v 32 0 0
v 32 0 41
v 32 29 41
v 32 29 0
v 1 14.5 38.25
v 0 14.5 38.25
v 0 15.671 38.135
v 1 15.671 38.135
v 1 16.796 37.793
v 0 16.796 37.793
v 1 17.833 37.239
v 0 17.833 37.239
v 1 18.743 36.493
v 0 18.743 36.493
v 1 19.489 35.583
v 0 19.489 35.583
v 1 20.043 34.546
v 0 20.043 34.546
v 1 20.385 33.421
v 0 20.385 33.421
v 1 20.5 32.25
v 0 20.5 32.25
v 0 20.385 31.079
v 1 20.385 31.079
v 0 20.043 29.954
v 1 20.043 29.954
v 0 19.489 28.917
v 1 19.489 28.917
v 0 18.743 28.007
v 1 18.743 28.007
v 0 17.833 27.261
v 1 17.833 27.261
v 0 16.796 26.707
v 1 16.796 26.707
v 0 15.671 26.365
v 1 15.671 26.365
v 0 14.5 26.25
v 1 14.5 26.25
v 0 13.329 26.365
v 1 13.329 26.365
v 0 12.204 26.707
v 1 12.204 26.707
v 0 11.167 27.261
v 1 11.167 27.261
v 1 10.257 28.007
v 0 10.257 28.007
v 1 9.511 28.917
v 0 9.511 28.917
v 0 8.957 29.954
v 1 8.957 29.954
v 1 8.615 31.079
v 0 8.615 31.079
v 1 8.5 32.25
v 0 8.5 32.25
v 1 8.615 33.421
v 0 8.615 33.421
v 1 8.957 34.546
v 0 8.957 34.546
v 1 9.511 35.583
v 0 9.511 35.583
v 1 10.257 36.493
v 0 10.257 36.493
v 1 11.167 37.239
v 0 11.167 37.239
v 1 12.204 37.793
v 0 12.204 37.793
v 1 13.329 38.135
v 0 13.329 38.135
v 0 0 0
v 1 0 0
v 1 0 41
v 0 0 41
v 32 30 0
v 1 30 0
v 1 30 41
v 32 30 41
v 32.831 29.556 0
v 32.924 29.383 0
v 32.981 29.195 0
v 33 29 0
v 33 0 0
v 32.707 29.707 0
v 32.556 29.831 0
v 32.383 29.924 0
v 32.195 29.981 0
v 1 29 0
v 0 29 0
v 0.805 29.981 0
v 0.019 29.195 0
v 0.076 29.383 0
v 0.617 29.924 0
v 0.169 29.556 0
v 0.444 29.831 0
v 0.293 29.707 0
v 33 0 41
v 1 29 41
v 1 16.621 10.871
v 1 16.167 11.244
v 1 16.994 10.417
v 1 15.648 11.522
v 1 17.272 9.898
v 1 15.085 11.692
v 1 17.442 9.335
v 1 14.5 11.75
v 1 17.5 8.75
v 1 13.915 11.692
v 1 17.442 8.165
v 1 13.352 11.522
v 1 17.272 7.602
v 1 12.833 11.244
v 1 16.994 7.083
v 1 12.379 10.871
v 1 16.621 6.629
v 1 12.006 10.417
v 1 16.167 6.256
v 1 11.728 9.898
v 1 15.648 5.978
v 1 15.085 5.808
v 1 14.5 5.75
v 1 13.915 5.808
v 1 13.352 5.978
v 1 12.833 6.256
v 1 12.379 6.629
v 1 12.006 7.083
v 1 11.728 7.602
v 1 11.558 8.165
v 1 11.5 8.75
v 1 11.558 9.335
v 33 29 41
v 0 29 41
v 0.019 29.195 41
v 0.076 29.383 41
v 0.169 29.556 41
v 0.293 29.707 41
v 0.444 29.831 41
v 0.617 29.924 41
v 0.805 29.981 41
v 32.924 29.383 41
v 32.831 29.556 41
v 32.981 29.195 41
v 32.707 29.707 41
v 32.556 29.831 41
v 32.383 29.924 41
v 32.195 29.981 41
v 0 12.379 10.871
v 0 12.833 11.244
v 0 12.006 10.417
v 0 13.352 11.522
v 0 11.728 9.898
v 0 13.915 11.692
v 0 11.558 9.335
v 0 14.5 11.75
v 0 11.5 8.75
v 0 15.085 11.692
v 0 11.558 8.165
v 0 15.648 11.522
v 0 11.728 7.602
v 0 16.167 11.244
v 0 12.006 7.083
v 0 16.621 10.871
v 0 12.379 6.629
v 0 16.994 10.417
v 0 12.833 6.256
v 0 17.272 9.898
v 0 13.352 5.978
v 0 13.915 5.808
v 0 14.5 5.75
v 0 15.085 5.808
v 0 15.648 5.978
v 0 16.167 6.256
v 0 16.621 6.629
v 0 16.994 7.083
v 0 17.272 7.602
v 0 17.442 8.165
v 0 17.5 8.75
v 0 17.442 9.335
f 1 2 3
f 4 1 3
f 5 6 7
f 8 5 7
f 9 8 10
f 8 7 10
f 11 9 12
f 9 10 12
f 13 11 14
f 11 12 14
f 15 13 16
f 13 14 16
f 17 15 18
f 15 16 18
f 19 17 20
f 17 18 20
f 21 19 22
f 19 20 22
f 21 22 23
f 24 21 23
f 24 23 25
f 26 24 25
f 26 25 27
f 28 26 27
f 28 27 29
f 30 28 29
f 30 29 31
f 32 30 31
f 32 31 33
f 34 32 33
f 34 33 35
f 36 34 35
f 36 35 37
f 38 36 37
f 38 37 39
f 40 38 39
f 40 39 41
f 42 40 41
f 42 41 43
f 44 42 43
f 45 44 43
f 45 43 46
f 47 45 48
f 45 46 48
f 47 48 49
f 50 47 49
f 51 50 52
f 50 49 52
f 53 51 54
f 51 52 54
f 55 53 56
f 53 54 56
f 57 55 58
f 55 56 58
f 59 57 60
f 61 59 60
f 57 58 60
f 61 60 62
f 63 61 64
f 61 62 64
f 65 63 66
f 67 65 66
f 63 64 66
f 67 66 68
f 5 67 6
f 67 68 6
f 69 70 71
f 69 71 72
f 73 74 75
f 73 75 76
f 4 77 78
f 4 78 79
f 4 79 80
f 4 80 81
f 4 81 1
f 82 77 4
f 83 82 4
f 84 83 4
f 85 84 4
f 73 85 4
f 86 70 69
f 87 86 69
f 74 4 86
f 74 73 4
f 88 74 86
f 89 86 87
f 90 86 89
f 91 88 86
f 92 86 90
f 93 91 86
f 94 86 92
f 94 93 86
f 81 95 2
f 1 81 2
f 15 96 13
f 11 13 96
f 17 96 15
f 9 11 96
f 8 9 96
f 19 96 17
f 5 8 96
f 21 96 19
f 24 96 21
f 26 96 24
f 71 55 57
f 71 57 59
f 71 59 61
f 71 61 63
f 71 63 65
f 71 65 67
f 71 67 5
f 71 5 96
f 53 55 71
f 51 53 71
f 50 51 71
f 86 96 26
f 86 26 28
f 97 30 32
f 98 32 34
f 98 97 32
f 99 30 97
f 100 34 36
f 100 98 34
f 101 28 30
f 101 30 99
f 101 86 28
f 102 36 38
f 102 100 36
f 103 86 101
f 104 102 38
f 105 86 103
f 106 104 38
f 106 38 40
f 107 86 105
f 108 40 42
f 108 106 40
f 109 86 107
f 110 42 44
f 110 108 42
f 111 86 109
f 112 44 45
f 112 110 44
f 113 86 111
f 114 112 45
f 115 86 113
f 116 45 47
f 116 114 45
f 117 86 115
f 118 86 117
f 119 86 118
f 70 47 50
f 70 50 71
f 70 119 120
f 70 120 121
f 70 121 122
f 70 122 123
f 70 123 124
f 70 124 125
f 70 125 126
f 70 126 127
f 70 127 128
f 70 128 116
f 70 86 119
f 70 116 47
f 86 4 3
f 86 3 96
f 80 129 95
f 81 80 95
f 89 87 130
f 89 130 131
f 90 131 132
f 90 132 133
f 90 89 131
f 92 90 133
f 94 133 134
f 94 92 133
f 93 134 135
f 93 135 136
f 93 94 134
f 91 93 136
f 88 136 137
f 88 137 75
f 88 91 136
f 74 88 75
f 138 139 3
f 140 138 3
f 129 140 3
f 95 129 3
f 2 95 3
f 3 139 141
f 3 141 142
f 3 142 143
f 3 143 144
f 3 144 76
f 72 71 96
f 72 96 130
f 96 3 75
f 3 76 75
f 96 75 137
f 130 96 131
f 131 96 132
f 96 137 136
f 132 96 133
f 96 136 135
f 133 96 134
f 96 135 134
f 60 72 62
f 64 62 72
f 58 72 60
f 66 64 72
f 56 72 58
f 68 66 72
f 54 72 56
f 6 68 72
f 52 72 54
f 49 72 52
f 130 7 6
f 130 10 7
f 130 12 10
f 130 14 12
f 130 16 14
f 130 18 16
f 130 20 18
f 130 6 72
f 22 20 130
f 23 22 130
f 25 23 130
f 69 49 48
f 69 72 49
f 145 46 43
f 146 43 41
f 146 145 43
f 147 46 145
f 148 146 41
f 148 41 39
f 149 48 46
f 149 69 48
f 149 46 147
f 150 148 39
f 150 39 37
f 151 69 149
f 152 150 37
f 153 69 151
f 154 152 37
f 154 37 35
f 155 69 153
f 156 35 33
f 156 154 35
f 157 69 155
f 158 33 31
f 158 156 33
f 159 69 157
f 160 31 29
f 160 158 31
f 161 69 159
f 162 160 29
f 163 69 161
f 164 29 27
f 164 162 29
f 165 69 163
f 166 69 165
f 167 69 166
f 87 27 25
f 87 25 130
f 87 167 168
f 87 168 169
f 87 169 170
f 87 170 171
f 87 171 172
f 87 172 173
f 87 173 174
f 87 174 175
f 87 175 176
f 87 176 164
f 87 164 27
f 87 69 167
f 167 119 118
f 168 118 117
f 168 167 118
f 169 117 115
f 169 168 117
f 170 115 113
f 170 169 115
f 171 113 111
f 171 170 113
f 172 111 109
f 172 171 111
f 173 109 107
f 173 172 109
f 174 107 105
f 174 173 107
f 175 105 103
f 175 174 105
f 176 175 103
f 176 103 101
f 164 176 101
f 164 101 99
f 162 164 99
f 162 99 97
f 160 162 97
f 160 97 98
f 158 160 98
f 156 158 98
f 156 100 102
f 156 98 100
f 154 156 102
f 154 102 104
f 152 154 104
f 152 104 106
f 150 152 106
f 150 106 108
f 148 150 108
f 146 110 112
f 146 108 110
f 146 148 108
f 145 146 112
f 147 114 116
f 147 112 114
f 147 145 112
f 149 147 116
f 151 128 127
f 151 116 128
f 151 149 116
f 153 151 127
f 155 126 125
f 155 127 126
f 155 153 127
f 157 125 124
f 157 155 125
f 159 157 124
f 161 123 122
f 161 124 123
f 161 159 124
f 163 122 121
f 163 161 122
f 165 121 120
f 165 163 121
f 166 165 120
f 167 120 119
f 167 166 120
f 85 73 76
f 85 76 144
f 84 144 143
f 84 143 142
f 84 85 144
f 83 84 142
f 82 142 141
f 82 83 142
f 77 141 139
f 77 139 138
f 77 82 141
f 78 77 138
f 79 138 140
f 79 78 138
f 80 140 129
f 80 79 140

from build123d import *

# Parameters (mm, degrees)
EKSTR_ZYON_NCE1_DEPTH = 41
IZIM2_R               = 3
KES_EKSTR_ZYON1_DEPTH = 5
IZIM4_R               = 6
KES_EKSTR_ZYON3_DEPTH = 22


with BuildPart() as part:
    # Çizim1 → Ekstrüzyon-İnce1 (new body)
    with BuildSketch(Plane.XY):
        with BuildLine():
            Line((0, 0), (0, 29))
            ThreePointArc((0, 29), (0.292893219, 29.707106781), (1, 30))
            Line((1, 30), (32, 30))
            ThreePointArc((32, 30), (32.707106781, 29.707106781), (33, 29))
            Line((33, 29), (33, 0))
            Line((33, 0), (32, 0))
            Line((32, 0), (32, 29))
            Line((32, 29), (1, 29))
            Line((1, 29), (1, 0))
            Line((1, 0), (0, 0))
        make_face()
    extrude(amount=EKSTR_ZYON_NCE1_DEPTH)

    # Çizim2 → Kes-Ekstrüzyon1 (cut)
    with BuildSketch(Plane(origin=(0, 0, 0), x_dir=(0, 0, -1), z_dir=(1, 0, 0))):
        with Locations((-32.25, 14.5)):
            Circle(IZIM2_R)
        with Locations((-8.75, 14.5)):
            Circle(IZIM2_R)
    extrude(amount=KES_EKSTR_ZYON1_DEPTH, mode=Mode.SUBTRACT)

    # Çizim4 → Kes-Ekstrüzyon3 (cut)
    with BuildSketch(Plane.ZY):
        with Locations((32.25, 14.5)):
            Circle(IZIM4_R)
    extrude(amount=-KES_EKSTR_ZYON3_DEPTH, mode=Mode.SUBTRACT)


solid = part.part
